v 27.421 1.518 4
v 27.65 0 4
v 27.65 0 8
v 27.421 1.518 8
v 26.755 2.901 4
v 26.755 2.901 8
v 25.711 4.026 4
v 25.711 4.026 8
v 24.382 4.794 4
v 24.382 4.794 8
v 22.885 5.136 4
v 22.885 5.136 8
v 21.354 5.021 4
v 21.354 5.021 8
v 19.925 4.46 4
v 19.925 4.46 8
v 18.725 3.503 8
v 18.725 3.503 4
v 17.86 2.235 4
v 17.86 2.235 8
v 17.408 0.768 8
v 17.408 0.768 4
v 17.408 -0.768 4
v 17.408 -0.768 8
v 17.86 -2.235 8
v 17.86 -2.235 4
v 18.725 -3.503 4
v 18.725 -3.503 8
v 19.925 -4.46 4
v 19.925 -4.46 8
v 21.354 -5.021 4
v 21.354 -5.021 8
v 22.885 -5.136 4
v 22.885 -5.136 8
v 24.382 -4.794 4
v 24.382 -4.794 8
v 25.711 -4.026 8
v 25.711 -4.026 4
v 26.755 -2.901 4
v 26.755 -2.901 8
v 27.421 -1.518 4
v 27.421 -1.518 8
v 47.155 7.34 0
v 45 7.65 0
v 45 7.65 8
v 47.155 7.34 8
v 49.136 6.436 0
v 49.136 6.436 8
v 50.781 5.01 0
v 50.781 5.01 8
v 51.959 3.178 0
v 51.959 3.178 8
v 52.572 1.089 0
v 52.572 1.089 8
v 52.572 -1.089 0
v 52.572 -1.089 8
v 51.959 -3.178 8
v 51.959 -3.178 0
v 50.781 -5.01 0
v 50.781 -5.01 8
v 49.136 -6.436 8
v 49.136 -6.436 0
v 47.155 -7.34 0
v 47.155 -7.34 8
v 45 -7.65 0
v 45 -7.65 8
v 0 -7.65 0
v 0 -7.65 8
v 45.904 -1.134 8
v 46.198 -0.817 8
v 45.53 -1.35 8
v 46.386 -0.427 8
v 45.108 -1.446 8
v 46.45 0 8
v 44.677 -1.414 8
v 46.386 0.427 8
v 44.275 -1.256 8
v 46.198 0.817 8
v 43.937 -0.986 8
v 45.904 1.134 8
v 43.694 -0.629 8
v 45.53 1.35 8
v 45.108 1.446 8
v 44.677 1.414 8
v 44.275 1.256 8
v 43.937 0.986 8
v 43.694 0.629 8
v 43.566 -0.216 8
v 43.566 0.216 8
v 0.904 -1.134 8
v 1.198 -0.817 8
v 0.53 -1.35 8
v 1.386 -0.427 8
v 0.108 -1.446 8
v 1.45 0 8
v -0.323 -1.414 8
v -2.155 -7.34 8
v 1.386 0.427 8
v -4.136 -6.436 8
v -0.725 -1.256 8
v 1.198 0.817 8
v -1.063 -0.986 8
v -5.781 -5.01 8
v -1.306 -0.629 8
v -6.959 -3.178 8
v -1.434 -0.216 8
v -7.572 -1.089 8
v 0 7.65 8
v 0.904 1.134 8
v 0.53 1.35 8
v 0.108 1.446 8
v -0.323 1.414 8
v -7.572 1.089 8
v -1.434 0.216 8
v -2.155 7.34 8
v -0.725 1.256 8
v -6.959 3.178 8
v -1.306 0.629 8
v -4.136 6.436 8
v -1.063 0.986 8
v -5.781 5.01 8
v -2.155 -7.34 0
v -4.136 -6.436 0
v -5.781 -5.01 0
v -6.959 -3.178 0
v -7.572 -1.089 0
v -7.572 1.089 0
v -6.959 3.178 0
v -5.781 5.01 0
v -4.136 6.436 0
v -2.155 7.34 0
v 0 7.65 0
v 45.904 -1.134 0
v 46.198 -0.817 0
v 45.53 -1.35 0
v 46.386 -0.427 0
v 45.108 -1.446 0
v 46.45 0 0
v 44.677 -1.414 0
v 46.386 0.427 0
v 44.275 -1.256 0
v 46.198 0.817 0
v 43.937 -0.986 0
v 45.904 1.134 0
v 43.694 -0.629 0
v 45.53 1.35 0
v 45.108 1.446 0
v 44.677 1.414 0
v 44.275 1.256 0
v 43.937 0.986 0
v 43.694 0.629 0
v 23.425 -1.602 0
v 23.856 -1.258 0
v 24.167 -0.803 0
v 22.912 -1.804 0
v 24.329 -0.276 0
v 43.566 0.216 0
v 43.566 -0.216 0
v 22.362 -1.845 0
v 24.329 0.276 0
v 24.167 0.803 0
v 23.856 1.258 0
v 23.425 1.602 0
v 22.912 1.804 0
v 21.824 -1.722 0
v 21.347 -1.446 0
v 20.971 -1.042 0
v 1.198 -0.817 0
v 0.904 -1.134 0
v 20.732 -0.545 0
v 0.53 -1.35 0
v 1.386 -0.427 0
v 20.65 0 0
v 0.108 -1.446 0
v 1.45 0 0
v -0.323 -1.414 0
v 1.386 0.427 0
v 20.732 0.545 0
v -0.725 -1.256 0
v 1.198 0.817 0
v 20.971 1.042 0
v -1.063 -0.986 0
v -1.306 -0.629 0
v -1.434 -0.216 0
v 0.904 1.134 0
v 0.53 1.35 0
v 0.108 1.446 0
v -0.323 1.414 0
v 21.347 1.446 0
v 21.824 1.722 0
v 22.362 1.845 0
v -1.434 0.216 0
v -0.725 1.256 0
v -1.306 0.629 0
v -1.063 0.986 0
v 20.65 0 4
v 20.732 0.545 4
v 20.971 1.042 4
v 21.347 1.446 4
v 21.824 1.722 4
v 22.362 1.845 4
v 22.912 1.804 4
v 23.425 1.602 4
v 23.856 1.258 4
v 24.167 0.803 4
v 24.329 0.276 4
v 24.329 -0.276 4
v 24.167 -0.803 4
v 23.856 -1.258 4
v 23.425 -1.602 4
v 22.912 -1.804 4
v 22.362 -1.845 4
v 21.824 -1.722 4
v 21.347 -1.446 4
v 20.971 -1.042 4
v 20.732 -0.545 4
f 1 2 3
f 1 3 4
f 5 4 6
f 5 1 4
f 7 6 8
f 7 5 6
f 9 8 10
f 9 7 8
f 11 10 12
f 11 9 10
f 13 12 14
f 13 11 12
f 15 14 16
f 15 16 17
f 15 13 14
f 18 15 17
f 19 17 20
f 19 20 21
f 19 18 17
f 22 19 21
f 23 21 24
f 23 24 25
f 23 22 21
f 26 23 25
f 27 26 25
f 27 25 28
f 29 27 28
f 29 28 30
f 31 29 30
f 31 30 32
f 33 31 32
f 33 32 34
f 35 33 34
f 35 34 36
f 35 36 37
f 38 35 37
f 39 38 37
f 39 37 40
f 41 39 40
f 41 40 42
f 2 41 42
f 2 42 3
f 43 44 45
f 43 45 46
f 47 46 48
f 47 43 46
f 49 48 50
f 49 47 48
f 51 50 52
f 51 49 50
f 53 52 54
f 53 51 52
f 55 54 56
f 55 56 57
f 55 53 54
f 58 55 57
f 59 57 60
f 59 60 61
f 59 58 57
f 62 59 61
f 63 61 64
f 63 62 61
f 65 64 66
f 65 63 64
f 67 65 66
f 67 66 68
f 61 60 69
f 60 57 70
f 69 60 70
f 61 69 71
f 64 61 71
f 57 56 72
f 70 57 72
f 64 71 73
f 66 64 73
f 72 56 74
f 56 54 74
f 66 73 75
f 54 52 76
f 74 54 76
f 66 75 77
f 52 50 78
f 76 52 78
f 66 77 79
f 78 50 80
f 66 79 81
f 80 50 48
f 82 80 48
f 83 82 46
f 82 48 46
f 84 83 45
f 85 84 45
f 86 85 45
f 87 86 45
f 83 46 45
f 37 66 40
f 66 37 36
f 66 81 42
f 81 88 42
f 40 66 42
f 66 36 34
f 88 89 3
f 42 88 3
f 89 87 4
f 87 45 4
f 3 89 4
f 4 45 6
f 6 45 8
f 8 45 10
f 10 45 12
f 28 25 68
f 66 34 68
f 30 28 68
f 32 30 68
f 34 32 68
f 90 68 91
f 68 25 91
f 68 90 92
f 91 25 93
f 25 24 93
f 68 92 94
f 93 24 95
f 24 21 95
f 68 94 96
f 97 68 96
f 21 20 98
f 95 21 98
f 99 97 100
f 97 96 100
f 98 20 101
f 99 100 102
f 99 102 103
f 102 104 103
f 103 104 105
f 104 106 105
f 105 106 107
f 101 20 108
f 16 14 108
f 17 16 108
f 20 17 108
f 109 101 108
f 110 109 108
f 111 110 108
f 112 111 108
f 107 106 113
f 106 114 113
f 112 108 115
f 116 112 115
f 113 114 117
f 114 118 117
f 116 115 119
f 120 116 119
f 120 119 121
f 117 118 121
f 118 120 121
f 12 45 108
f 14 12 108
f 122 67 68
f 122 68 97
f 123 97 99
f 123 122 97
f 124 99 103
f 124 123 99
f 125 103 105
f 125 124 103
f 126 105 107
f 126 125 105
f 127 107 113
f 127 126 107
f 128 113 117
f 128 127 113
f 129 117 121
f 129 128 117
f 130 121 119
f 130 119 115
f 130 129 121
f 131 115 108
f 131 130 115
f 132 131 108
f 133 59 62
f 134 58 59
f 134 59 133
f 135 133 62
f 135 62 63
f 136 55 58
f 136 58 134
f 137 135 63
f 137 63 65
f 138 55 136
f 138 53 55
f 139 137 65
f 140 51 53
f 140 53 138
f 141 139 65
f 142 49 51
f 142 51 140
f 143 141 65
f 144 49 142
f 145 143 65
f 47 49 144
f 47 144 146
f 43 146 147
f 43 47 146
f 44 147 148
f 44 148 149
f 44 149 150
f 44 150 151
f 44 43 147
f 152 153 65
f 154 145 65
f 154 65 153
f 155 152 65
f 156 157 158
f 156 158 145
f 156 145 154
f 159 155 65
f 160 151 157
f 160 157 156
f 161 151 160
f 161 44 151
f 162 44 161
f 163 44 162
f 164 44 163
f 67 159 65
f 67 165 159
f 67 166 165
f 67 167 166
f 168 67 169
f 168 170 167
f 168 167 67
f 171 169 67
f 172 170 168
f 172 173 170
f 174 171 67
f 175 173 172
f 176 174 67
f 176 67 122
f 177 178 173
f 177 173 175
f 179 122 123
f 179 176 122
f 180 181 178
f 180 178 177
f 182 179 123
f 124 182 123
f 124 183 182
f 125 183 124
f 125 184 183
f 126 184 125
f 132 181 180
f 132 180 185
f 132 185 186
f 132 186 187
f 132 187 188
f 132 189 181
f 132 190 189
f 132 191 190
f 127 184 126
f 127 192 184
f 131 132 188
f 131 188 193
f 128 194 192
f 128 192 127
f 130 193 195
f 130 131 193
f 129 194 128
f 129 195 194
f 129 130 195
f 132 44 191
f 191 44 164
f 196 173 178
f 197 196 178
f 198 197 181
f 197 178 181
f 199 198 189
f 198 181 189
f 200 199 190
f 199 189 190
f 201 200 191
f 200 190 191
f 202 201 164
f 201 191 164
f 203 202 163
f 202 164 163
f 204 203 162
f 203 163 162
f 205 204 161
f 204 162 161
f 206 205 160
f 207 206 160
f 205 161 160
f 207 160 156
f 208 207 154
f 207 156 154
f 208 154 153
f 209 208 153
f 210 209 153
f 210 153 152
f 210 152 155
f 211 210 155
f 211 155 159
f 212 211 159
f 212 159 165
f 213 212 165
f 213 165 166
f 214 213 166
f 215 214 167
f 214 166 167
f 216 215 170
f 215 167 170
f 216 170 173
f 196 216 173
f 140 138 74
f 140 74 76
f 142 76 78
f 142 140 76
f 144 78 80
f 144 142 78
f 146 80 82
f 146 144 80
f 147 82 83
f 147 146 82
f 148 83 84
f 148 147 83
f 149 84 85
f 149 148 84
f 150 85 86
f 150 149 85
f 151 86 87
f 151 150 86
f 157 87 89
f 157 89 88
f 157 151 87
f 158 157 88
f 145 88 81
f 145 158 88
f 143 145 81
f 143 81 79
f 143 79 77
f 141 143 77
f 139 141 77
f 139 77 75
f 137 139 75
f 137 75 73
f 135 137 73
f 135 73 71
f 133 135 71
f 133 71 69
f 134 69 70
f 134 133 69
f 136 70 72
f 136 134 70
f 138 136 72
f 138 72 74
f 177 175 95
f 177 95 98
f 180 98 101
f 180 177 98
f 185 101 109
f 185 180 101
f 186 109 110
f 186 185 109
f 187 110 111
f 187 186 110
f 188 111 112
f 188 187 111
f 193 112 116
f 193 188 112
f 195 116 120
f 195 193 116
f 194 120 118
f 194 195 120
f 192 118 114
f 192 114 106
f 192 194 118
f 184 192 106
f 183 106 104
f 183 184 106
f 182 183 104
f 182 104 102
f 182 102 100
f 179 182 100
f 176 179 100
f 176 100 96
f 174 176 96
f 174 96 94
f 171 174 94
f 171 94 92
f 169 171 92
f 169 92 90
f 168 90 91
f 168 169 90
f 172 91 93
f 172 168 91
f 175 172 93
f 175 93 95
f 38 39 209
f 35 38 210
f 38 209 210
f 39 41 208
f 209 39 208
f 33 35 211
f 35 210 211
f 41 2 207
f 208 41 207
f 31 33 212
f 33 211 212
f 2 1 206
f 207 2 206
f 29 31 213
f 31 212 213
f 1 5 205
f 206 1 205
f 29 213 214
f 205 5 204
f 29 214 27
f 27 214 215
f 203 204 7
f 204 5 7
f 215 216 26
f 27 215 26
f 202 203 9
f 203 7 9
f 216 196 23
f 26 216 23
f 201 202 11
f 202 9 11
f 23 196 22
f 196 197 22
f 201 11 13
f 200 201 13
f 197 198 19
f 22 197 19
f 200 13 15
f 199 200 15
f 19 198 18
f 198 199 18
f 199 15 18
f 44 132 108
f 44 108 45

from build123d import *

# Parameters (mm, degrees)
SKETCH_1_R      = 1.45
SKETCH_1_R_2    = 5.15
EXTRUDE_1_DEPTH = 8
SKETCH_2_R      = 5.305373799
SKETCH_2_R_2    = 1.85
EXTRUDE_2_DEPTH = 4


with BuildPart() as part:
    # Эскиз1 → Бобышка-Вытянуть1 (new body)
    with BuildSketch(Plane.XY):
        with BuildLine():
            Line((0, 7.65), (45, 7.65))
            ThreePointArc((45, 7.65), (52.65, 0), (45, -7.65))
            Line((45, -7.65), (0, -7.65))
            ThreePointArc((0, -7.65), (-7.65, 0), (0, 7.65))
        make_face()
        Circle(SKETCH_1_R, mode=Mode.SUBTRACT)
        with Locations((45, 0)):
            Circle(SKETCH_1_R, mode=Mode.SUBTRACT)
        with Locations((22.5, 0)):
            Circle(SKETCH_1_R_2, mode=Mode.SUBTRACT)
    extrude(amount=EXTRUDE_1_DEPTH)

    # Эскиз2 → Бобышка-Вытянуть2 (add)
    with BuildSketch(Plane(origin=(0, 0, 0), x_dir=(-1, 0, 0), z_dir=(0, 0, -1))):
        with Locations((-22.5, 0)):
            Circle(SKETCH_2_R)
        with Locations((-22.5, 0)):
            Circle(SKETCH_2_R_2, mode=Mode.SUBTRACT)
    extrude(amount=-EXTRUDE_2_DEPTH)


solid = part.part
